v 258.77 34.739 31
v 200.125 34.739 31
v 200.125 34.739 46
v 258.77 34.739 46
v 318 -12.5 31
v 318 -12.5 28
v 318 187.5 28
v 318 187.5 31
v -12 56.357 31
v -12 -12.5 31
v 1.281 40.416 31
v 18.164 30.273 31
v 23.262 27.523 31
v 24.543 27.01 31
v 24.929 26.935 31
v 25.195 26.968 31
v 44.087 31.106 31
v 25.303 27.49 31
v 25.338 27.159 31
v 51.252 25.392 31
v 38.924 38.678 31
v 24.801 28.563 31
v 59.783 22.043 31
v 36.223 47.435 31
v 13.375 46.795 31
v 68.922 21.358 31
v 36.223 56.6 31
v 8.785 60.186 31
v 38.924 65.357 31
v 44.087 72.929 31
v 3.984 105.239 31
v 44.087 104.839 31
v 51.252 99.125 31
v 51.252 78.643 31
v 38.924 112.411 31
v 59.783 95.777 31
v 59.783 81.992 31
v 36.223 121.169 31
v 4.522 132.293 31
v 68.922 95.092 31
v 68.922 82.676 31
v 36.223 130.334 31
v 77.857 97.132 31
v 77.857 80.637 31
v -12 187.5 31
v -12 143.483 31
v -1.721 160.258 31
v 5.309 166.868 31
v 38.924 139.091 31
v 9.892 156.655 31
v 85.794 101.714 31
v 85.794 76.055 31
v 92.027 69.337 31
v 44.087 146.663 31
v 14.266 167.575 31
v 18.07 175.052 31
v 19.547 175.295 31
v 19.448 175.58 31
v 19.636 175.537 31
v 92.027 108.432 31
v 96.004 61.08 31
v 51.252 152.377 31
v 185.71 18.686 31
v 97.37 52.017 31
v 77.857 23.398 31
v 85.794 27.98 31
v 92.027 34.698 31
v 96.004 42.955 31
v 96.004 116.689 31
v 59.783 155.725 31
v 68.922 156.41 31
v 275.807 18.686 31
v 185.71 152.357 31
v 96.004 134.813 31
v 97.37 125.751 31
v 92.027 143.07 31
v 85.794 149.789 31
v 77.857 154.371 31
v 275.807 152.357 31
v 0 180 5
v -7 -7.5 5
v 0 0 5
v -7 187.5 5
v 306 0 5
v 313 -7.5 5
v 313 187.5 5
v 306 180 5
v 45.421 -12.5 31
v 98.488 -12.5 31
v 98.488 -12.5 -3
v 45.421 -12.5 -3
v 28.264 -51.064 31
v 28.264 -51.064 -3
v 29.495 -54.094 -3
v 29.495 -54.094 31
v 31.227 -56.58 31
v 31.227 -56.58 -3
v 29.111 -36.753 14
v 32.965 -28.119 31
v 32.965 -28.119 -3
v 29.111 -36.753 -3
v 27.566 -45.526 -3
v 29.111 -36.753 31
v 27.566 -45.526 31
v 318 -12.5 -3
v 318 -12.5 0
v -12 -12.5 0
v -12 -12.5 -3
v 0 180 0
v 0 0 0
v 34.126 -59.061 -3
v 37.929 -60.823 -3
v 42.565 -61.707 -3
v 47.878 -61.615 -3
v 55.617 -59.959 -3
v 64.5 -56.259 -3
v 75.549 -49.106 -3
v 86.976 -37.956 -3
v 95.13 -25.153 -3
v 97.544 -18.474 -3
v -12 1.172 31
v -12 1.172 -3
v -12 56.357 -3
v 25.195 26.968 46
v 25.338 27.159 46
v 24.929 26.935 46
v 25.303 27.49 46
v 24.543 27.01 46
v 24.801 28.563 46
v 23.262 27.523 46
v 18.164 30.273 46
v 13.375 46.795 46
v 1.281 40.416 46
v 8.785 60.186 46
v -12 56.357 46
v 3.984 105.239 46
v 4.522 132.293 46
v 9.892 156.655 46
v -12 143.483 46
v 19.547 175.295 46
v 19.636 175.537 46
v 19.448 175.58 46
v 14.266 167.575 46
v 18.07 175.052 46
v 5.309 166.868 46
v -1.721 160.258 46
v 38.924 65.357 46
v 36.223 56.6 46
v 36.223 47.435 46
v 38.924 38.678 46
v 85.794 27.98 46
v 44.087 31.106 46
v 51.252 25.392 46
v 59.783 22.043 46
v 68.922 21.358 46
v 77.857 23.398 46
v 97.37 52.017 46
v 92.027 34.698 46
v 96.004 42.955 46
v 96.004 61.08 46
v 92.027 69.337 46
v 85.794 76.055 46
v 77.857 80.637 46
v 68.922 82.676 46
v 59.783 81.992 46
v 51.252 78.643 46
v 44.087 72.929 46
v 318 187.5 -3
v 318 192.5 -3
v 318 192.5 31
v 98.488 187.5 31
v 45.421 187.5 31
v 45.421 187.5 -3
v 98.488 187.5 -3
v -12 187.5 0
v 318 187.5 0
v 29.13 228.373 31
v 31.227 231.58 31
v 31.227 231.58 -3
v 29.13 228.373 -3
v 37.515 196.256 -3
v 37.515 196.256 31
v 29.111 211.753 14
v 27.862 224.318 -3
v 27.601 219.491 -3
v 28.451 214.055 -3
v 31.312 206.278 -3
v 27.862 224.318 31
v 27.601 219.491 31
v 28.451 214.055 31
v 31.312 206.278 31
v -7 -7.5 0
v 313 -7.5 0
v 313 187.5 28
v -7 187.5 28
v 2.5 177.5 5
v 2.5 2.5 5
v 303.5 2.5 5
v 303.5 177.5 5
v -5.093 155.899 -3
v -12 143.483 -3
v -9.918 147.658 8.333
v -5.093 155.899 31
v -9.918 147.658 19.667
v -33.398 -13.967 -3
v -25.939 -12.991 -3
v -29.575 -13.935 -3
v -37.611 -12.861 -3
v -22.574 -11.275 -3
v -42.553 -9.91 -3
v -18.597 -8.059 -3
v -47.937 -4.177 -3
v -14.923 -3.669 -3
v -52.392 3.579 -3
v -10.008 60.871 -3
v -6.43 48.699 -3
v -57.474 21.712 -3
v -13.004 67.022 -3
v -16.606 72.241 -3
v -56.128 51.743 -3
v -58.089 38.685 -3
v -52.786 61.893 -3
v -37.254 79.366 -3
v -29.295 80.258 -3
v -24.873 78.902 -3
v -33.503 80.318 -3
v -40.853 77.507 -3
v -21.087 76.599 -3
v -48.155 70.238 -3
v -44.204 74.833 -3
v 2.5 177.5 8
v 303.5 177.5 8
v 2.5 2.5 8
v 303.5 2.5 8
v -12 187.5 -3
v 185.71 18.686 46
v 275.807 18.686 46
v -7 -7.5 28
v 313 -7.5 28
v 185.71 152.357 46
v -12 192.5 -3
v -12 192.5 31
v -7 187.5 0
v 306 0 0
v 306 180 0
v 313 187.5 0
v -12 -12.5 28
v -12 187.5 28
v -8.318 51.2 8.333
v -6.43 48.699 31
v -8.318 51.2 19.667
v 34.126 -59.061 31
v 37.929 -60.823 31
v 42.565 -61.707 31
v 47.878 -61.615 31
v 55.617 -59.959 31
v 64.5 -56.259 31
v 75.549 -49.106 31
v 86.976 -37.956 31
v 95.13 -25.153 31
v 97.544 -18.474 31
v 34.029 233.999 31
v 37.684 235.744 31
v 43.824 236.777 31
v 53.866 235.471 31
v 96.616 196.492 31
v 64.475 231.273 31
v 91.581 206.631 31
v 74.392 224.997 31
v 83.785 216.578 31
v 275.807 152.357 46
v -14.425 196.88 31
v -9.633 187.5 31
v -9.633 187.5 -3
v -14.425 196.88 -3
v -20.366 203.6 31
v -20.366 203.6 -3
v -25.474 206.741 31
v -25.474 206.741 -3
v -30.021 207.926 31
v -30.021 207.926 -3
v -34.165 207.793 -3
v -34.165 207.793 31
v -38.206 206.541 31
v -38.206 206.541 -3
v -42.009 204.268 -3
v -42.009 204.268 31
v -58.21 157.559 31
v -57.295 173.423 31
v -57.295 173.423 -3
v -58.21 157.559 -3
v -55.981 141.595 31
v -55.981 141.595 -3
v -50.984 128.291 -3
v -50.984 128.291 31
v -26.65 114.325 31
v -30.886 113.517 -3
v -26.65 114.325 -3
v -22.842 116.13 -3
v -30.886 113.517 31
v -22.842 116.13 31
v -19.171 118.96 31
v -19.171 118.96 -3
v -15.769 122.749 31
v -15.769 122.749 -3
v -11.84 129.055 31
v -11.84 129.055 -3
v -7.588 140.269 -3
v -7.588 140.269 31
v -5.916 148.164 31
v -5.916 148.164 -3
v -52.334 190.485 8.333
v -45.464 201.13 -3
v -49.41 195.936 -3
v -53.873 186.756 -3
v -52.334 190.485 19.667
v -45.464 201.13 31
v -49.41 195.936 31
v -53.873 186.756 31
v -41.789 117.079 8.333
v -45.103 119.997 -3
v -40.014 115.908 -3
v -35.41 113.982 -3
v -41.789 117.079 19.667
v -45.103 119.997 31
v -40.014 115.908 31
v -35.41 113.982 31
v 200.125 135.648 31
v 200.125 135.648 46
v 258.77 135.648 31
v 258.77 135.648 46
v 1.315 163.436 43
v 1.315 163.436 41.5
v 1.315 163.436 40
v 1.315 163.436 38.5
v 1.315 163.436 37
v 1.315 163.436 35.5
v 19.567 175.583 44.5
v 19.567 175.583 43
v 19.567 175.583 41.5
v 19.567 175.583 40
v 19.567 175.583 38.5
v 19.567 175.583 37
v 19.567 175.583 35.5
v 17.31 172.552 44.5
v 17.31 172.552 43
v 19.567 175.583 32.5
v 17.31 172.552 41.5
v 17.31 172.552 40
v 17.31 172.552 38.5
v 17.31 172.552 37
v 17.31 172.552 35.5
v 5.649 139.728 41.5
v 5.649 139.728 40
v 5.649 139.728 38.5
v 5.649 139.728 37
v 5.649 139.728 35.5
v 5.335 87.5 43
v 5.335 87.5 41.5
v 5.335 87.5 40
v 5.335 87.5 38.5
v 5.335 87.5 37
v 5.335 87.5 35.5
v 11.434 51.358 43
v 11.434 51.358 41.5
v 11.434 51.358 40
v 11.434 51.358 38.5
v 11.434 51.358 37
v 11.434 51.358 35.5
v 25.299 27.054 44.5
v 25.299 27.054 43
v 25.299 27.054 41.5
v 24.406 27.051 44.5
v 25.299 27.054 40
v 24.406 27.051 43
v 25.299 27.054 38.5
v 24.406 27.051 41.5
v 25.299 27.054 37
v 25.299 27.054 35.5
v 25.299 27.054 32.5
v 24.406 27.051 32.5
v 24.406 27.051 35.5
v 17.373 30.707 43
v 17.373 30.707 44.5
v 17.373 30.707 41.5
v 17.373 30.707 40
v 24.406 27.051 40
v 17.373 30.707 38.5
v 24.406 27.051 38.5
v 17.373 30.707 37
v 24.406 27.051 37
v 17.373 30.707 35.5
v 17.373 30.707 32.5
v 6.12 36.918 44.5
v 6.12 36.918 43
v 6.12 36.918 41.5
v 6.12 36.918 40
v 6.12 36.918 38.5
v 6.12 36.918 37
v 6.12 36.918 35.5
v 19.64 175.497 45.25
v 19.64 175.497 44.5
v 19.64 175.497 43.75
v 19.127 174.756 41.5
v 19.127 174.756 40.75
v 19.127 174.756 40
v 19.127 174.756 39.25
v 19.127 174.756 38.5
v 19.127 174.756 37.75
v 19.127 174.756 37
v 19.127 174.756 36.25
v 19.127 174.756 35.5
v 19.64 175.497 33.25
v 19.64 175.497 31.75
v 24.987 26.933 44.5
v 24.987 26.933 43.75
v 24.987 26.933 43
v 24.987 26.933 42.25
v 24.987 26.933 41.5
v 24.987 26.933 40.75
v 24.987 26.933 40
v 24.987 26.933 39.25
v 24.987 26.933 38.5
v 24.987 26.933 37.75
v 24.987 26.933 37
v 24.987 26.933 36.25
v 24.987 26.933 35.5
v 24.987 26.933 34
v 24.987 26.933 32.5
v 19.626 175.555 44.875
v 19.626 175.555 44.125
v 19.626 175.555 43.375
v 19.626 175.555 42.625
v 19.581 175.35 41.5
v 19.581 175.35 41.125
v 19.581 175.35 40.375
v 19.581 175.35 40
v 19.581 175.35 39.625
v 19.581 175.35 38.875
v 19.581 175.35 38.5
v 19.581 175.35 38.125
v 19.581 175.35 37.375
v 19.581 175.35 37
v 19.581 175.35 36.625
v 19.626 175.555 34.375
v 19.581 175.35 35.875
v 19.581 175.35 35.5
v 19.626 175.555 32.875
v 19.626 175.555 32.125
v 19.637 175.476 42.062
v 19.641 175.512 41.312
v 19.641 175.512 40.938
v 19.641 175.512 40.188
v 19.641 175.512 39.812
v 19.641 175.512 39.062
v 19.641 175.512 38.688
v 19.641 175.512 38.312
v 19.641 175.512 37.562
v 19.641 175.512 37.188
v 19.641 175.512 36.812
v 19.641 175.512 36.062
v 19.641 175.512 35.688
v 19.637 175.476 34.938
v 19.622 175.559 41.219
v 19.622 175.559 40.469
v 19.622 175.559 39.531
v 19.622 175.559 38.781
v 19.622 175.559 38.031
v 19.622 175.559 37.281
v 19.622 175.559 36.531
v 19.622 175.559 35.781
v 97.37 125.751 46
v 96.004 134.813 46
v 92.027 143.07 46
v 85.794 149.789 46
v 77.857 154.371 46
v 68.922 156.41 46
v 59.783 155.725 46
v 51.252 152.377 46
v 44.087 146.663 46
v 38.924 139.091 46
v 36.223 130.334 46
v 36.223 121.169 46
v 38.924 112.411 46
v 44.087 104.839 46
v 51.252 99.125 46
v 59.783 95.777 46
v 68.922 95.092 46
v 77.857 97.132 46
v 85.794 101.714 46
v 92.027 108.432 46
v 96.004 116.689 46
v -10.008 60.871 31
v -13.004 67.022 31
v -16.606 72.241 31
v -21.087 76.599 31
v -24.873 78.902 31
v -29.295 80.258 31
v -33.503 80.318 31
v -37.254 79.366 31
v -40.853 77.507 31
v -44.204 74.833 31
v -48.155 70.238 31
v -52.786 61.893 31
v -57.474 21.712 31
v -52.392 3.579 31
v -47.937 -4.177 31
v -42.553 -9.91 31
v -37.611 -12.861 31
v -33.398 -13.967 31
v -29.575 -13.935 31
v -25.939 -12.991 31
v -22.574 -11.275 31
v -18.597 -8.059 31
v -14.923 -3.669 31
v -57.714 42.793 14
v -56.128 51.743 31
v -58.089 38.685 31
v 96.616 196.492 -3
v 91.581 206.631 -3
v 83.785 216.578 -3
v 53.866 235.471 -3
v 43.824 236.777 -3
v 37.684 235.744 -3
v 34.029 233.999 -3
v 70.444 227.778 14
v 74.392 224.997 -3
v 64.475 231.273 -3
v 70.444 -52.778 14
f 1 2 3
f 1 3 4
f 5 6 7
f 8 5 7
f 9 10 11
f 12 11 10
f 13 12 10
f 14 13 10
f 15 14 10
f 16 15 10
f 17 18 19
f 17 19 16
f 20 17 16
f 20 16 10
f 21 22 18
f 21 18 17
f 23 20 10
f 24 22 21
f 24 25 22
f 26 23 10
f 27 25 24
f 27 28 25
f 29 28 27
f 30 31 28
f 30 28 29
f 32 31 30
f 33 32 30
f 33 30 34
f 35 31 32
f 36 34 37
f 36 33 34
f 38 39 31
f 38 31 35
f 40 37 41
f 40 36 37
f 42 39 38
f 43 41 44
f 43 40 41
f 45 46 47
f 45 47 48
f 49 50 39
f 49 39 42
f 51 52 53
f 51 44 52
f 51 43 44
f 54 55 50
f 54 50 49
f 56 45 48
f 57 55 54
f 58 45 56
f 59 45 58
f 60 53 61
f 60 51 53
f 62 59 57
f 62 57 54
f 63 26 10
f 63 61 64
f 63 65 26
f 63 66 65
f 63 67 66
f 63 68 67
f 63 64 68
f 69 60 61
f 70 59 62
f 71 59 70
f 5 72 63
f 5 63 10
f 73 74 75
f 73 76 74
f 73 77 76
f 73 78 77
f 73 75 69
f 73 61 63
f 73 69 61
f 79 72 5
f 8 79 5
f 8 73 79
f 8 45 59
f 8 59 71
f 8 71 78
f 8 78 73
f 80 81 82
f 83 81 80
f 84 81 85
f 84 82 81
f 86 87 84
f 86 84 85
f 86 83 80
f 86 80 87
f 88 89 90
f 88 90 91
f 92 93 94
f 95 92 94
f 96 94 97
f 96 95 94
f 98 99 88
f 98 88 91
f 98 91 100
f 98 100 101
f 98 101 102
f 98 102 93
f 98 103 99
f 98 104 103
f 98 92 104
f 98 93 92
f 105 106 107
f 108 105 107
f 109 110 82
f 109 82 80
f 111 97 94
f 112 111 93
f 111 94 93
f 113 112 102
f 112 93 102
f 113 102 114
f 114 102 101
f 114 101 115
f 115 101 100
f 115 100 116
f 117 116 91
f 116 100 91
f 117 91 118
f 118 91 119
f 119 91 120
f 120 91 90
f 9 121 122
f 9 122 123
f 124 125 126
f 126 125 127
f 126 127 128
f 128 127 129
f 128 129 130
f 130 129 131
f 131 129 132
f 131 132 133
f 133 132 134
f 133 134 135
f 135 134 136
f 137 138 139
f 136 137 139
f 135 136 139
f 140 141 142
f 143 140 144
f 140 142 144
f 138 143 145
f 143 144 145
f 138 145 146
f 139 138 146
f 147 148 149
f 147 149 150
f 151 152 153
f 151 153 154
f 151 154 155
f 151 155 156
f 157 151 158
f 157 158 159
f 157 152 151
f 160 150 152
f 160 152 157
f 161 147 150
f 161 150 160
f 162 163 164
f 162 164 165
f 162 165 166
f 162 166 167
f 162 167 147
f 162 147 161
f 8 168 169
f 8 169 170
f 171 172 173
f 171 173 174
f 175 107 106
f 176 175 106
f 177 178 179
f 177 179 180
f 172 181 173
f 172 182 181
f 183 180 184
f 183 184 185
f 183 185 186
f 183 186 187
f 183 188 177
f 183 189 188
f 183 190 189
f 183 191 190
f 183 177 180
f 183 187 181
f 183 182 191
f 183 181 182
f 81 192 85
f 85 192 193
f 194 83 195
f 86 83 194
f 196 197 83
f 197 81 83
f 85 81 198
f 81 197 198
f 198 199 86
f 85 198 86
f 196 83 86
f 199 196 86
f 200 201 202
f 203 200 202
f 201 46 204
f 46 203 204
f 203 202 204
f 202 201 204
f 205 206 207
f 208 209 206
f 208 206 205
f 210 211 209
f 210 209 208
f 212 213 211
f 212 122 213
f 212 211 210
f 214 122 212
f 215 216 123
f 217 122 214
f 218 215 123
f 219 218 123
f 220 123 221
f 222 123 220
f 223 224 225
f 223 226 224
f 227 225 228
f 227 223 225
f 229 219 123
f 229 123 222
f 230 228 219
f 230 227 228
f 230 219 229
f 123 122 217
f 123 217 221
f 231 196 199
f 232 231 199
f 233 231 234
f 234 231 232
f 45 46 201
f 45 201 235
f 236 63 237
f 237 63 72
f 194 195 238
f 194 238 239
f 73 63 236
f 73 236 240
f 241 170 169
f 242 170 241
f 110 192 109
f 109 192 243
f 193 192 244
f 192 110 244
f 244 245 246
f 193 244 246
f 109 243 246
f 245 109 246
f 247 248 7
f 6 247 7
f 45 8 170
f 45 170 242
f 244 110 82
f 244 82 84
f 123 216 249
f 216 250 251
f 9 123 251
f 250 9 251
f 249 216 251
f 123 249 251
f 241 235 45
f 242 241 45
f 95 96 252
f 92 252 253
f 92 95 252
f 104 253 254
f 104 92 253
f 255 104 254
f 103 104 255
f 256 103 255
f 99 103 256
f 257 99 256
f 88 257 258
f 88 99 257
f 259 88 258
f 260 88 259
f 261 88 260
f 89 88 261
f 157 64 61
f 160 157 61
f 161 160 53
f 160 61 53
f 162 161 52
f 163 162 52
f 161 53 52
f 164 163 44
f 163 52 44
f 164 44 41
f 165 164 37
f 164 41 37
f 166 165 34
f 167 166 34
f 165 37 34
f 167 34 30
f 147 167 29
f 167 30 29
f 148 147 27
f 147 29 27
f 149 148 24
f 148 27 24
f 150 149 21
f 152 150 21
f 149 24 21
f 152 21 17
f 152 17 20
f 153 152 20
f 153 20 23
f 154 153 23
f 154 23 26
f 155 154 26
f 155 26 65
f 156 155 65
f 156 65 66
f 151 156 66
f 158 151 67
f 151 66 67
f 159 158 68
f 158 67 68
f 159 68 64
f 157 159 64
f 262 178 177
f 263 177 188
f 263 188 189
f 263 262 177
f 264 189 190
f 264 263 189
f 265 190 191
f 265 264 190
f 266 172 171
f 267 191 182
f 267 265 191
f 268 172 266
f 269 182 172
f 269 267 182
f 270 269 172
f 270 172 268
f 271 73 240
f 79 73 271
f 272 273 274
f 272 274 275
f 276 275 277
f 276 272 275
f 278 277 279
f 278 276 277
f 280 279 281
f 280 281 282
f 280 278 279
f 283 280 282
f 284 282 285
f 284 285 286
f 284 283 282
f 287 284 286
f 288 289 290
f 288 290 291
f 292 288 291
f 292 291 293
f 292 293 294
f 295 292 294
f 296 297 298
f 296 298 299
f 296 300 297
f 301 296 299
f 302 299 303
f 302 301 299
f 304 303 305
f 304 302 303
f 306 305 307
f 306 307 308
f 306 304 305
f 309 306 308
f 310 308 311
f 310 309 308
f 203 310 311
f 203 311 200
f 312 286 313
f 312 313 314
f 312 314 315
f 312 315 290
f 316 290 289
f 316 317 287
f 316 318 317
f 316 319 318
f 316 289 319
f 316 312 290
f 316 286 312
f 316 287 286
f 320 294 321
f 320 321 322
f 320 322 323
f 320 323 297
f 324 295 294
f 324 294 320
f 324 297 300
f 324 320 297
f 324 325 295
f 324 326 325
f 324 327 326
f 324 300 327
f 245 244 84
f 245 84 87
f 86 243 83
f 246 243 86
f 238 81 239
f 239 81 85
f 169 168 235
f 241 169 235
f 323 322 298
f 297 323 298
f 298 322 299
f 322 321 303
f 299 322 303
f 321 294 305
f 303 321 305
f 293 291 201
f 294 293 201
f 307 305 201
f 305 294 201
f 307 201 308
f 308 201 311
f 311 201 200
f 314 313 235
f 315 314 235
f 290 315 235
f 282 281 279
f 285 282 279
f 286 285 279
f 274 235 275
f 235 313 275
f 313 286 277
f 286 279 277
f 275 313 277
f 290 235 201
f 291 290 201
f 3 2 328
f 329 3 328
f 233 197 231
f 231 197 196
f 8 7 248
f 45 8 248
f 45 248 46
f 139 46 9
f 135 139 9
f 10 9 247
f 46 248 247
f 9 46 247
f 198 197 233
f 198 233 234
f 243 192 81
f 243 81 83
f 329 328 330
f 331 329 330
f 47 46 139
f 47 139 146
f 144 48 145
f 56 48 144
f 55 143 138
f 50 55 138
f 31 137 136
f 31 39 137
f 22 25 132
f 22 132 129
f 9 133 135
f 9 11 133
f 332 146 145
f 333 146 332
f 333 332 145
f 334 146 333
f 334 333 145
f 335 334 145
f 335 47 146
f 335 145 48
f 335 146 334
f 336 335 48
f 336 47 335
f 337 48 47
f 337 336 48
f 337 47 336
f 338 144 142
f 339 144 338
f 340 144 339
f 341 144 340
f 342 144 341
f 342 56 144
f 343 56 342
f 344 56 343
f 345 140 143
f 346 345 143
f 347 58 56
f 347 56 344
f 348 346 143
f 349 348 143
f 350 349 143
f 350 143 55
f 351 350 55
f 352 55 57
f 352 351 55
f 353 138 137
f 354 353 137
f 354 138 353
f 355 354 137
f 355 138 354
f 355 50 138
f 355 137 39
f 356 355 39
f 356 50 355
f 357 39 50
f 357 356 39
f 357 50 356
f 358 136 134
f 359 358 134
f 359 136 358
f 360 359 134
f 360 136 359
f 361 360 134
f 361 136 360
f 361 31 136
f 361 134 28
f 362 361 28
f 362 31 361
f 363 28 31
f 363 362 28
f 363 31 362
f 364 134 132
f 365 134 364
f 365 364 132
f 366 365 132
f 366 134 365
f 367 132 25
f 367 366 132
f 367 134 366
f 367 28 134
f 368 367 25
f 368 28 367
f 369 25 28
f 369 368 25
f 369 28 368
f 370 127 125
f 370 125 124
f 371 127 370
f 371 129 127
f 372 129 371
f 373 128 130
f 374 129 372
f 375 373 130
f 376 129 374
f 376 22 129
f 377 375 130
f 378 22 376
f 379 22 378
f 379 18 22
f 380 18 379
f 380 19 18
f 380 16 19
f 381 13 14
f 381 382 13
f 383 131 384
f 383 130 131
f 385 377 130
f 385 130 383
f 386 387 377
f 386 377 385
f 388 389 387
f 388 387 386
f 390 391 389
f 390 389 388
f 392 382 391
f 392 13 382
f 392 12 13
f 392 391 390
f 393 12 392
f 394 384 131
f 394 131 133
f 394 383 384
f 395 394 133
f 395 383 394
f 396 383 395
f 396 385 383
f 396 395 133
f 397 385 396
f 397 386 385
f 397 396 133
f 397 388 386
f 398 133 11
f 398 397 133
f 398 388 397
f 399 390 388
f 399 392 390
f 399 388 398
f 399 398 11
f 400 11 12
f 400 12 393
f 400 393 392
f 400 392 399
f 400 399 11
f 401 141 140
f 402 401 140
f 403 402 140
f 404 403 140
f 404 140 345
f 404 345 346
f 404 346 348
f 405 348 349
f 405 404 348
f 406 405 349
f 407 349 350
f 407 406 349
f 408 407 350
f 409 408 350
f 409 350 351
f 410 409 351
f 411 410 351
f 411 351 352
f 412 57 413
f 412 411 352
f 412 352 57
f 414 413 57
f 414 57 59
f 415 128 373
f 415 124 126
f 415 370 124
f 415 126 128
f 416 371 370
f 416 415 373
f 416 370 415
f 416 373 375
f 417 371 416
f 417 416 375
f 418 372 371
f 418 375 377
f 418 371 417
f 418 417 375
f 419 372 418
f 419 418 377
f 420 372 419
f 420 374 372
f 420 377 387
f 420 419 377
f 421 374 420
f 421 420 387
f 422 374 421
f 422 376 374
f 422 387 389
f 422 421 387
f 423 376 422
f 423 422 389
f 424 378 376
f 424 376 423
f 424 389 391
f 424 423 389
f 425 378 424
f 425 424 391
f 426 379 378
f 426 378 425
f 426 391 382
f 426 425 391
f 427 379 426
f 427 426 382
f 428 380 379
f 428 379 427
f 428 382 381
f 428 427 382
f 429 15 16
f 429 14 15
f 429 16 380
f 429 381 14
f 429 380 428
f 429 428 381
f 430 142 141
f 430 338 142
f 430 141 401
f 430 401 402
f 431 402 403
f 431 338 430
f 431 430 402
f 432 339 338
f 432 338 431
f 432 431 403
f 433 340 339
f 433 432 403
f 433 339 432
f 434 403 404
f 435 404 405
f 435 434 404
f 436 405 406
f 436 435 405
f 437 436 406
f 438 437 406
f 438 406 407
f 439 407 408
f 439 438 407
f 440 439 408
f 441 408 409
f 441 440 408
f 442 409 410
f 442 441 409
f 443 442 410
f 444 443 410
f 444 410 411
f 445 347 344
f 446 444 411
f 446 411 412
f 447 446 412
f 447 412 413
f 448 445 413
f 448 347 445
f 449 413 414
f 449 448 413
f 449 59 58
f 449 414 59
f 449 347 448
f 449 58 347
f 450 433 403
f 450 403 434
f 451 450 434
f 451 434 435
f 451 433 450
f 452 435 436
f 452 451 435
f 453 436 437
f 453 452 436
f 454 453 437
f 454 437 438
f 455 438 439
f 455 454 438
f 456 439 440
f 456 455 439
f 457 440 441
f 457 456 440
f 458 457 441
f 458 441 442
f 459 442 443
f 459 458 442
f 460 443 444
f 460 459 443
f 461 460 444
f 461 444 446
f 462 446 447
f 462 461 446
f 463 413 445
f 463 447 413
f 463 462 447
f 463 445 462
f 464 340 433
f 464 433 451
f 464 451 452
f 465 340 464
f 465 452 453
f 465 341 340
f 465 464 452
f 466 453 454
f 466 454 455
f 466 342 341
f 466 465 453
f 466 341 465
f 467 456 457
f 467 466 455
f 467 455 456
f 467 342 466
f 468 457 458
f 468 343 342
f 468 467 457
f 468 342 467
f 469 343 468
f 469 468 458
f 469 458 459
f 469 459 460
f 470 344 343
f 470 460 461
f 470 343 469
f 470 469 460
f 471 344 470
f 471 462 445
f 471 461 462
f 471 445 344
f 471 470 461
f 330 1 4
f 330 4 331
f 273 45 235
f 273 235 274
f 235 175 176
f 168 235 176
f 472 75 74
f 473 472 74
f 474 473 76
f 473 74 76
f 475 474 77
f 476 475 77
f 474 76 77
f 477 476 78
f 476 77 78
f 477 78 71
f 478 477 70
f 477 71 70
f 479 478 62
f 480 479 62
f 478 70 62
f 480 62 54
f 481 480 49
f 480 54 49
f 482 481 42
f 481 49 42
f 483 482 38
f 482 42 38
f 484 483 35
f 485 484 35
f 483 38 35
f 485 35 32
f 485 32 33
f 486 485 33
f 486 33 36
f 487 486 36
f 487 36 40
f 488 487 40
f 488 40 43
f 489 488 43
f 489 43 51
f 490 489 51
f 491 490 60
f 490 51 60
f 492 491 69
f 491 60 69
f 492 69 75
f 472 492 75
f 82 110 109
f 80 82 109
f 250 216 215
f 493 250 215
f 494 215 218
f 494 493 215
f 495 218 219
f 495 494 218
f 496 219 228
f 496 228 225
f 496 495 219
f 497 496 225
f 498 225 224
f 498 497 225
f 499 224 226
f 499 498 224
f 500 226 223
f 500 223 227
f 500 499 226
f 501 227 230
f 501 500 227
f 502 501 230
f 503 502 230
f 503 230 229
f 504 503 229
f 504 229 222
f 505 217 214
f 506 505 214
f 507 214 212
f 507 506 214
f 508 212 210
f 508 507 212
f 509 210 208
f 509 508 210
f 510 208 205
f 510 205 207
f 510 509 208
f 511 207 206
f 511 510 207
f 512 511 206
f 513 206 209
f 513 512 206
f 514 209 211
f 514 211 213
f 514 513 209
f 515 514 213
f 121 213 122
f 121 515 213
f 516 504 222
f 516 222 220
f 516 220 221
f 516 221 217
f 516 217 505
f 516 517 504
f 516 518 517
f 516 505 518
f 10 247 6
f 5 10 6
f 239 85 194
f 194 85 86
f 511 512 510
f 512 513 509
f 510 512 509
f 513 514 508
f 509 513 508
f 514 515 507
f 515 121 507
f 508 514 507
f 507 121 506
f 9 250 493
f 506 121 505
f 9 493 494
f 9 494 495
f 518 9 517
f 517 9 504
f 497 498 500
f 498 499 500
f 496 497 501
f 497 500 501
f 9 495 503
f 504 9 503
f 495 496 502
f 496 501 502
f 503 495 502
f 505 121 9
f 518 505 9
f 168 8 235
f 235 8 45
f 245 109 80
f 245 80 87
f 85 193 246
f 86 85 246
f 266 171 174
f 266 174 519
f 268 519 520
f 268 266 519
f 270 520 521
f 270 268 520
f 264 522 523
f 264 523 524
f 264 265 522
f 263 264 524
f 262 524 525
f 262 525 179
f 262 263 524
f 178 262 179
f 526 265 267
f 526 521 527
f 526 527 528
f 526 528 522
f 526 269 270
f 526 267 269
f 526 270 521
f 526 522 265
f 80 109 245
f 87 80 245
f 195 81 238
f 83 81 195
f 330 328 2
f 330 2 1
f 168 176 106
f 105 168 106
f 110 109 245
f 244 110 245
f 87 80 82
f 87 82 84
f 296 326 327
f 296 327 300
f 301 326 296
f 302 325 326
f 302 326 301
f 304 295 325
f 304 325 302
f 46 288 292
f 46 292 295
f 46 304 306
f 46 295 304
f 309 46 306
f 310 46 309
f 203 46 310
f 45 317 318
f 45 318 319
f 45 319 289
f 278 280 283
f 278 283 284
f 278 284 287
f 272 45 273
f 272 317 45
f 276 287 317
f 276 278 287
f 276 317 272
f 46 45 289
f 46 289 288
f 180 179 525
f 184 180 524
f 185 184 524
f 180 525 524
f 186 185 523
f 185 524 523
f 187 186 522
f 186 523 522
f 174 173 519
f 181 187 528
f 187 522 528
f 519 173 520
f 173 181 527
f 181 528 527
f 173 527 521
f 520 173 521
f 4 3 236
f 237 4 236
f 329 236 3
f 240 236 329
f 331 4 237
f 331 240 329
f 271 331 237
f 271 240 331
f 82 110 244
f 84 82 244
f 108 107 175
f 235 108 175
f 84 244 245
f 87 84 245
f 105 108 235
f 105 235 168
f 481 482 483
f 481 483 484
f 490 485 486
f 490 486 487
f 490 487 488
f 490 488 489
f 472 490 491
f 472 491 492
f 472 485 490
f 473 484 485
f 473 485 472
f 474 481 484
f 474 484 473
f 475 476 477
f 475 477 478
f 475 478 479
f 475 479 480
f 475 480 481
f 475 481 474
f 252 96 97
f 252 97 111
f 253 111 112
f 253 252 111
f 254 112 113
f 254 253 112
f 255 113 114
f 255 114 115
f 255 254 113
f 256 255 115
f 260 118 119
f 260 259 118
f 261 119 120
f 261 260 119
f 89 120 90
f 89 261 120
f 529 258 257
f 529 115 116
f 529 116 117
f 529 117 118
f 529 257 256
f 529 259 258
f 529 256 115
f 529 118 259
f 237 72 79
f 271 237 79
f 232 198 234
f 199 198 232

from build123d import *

# Parameters (mm, degrees)
F0_W      = 306
F0_H      = 180
F1_DEPTH  = 5
F2_W      = 320
F2_H      = 195
F3_DEPTH  = 5
F5_W      = 320
F5_H      = 195
F5_H_2    = 5
F6_DEPTH  = 3
F7_W      = 320
F7_H      = 195
F7_W_2    = 301
F7_H_2    = 175
F8_DEPTH  = 3
F9_W      = 320
F9_H      = 195
F10_DEPTH = 20
F11_W     = 320
F11_H     = 5
F11_H_2   = 195
F12_DEPTH = 3
F13_W     = 330
F13_H     = 34
F14_DEPTH = 5
F15_R     = 30.7449551085
F15_W     = 90.0971293449
F15_H     = 133.6713824421
F15_W_2   = 58.6450397968
F15_H_2   = 100.9088121355
F16_DEPTH = 15
F18_DEPTH = 34


with BuildPart() as f1:
    # F0 (on Top) → F1 (new body)
    with BuildSketch(Plane.XY):
        with Locations((153, 90)):
            Rectangle(F0_W, F0_H)
    extrude(amount=F1_DEPTH)


with BuildPart() as f3:
    # F2 (on Top) → F3 (new body)
    with BuildSketch(Plane.XY):
        with Locations((153, 90)):
            Rectangle(F2_W, F2_H)
    extrude(amount=F3_DEPTH)

    # F4: cut F1
    add(f1.part, mode=Mode.SUBTRACT)


with BuildPart() as f6:
    # F5 (on face) → F6 (new body)
    with BuildSketch(Plane(origin=(0, 0, 0), x_dir=(1, 0, 0), z_dir=(0, 0, -1))):
        with Locations((153, -90)):
            Rectangle(F5_W, F5_H)
        Polygon((313, 7.5), (313, -187.5), (318, -187.5), (318, 12.5), (313, 12.5), align=None)
        Polygon((-12, -187.5), (-7, -187.5), (-7, 7.5), (-7, 12.5), (-12, 12.5), align=None)
        with Locations((153, 10)):
            Rectangle(F5_W, F5_H_2)
    extrude(amount=F6_DEPTH)


with BuildPart() as f8:
    # F7 (on face) → F8 (new body)
    with BuildSketch(Plane.XY.offset(5)):
        with Locations((153, 90)):
            Rectangle(F7_W, F7_H)
        with Locations((153, 90)):
            Rectangle(F7_W_2, F7_H_2, mode=Mode.SUBTRACT)
    extrude(amount=F8_DEPTH)

    # F9 (on face) → F10 (join)
    with BuildSketch(Plane.XY.offset(8)):
        with Locations((153, 90)):
            Rectangle(F9_W, F9_H)
    extrude(amount=F10_DEPTH)


with BuildPart() as f12:
    # F11 (on face) → F12 (new body)
    with BuildSketch(Plane.XY.offset(28)):
        with Locations((153, -10)):
            Rectangle(F11_W, F11_H)
        with Locations((153, 90)):
            Rectangle(F11_W, F11_H_2)
        Polygon((313, 187.5), (313, -7.5), (313, -12.5), (318, -12.5), (318, 187.5), align=None)
        Polygon((-7, -12.5), (-7, -7.5), (-7, 187.5), (-12, 187.5), (-12, -12.5), align=None)
    extrude(amount=F12_DEPTH)

    # F15 (on face) → F16 (join)
    with BuildSketch(Plane.XY.offset(31)):
        with Locations((66.6246637702, 125.7512122393)):
            Circle(F15_R)
        with Locations((66.6246637702, 52.0174270496)):
            Circle(F15_R)
        with BuildLine():
            add(Edge.make_bspline(
                [(-12, 143.482670188), (-8.4560991253, 150.6922997365), (-1.740489571, 164.354366727), (23.5333067725, 178.4553375923), (13.3351713308, 169.8795160599), (1.1678930231, 130.9418356581), (5.5946860848, 88.0999725822), (8.0178004618, 48.3556264894), (30.7079728341, 22.8204028991), (15.8051919315, 31.9073003897), (0.1729151164, 39.052800566), (-7.8726862997, 50.4898921624), (-12, 56.3570559025)],
                knots=[0, 0, 0, 0, 0.1051986722, 0.1993487942, 0.2469565312, 0.3789347665, 0.5196184826, 0.655465745, 0.7532822793, 0.8145186809, 0.9048496625, 1, 1, 1, 1], degree=3))
            Line((-12, 143.482670188), (-12, 56.3570559025))
        make_face()
        with Locations((230.7583391666, 85.5212910101)):
            Rectangle(F15_W, F15_H)
        with Locations((229.4478267431, 85.193650797)):
            Rectangle(F15_W_2, F15_H_2, mode=Mode.SUBTRACT)
    extrude(amount=F16_DEPTH)


with BuildPart() as f14:
    # F13 (on face) → F14 (new body)
    with BuildSketch(Plane(origin=(0, 187.5, 0), x_dir=(-1, 0, 0), z_dir=(0, 1, 0))):
        with Locations((-153, 14)):
            Rectangle(F13_W, F13_H)
    extrude(amount=F14_DEPTH)


with BuildPart() as f18:
    # F17 (on face) → F18 (new body, through all)
    with BuildSketch(Plane.XY.offset(31)):
        with BuildLine():
            add(Edge.make_bspline(
                [(-6.4304488837, 48.6989639499), (-8.3434899275, 51.1591705456), (-10.1717460748, 53.7581099738), (-12, 56.3570559025)],
                knots=[0.9578517674, 0.9578517674, 0.9578517674, 0.9578517674, 1, 1, 1, 1], degree=3))
            add(Edge.make_bspline(
                [(-6.4304488837, 48.6989639499), (-38.0992871239, 210.1686925871), (-57.7137195615, 42.7925264452), (-77.3281519992, -124.5836396968), (-12, 1.1722197553)],
                knots=[5.0469666126, 5.0469666126, 5.0469666126, 7.6491731862, 7.6491731862, 10.2513797599, 10.2513797599, 10.2513797599], degree=2, weights=[1, 0.266435585, 1, 0.266435585, 1]))
            Line((-12, 1.1722197553), (-12, 56.3570559025))
        make_face()
    extrude(amount=-F18_DEPTH)


with BuildPart() as f18b:
    # F17 (on face) → F18, piece 2 (new body, through all)
    with BuildSketch(Plane.XY.offset(31)):
        with BuildLine():
            Line((-12, 187.5), (-9.6329098682, 187.5))
            add(Edge.make_bspline(
                [(-9.6329098682, 187.5), (-29.8549870938, 239.7130504336), (-52.3337852314, 190.484666173), (-74.812583369, 141.2562819125), (-41.7888337095, 117.0787895145), (-8.76508405, 92.9012971165), (-5.0933067813, 155.8987599577)],
                knots=[5.3140017065, 5.3140017065, 5.3140017065, 7.1735435828, 7.1735435828, 9.0330854591, 9.0330854591, 10.8926273354, 10.8926273354, 10.8926273354], degree=2, weights=[1, 0.5980175871, 1, 0.5980175871, 1, 0.5980175871, 1]))
            add(Edge.make_bspline(
                [(-12, 143.482670188), (-9.9453503048, 147.6626017601), (-7.8906991897, 151.8425339223), (-5.0933067813, 155.8987599577)],
                knots=[0, 0, 0, 0, 0.060991102, 0.060991102, 0.060991102, 0.060991102], degree=3))
            Line((-12, 143.482670188), (-12, 187.5))
        make_face()
    extrude(amount=-F18_DEPTH)


with BuildPart() as f18c:
    # F17 (on face) → F18, piece 3 (new body, through all)
    with BuildSketch(Plane.XY.offset(31)):
        with BuildLine():
            Line((98.487765613, -12.5), (45.4211161304, -12.5))
            add(Edge.make_bspline(
                [(45.4211161304, -12.5), (16.4623234608, -39.7918203939), (31.227260828, -56.5803945065)],
                knots=[4.7736765188, 4.7736765188, 4.7736765188, 6.2831853072, 6.2831853072, 6.2831853072], degree=2, weights=[1, 0.7284398321, 1]))
            add(Edge.make_bspline(
                [(31.227260828, -56.5803945065), (43.444785004, -70.4724148381), (70.4443309542, -52.7777715881), (97.4438769045, -35.0831283382), (98.487765613, -12.5)],
                knots=[0, 0, 0, 1.3226723219, 1.3226723219, 2.6453446438, 2.6453446438, 2.6453446438], degree=2, weights=[1, 0.7891723038, 1, 0.7891723038, 1]))
        make_face()
    extrude(amount=-F18_DEPTH)


with BuildPart() as f18d:
    # F17 (on face) → F18, piece 4 (new body, through all)
    with BuildSketch(Plane.XY.offset(31)):
        with BuildLine():
            add(Edge.make_bspline(
                [(31.227260828, 231.5803945065), (16.4623234608, 214.7918203939), (45.4211161304, 187.5)],
                knots=[0, 0, 0, 1.5095087884, 1.5095087884, 1.5095087884], degree=2, weights=[1, 0.7284398321, 1]))
            Line((45.4211161304, 187.5), (98.487765613, 187.5))
            add(Edge.make_bspline(
                [(98.487765613, 187.5), (97.4438769045, 210.0831283382), (70.4443309542, 227.7777715881), (43.444785004, 245.4724148381), (31.227260828, 231.5803945065)],
                knots=[3.6378406634, 3.6378406634, 3.6378406634, 4.9605129853, 4.9605129853, 6.2831853072, 6.2831853072, 6.2831853072], degree=2, weights=[1, 0.7891723038, 1, 0.7891723038, 1]))
        make_face()
    extrude(amount=-F18_DEPTH)


solid = Compound([f1.part, f3.part, f6.part, f8.part, f12.part, f14.part, f18.part, f18b.part, f18c.part, f18d.part])
